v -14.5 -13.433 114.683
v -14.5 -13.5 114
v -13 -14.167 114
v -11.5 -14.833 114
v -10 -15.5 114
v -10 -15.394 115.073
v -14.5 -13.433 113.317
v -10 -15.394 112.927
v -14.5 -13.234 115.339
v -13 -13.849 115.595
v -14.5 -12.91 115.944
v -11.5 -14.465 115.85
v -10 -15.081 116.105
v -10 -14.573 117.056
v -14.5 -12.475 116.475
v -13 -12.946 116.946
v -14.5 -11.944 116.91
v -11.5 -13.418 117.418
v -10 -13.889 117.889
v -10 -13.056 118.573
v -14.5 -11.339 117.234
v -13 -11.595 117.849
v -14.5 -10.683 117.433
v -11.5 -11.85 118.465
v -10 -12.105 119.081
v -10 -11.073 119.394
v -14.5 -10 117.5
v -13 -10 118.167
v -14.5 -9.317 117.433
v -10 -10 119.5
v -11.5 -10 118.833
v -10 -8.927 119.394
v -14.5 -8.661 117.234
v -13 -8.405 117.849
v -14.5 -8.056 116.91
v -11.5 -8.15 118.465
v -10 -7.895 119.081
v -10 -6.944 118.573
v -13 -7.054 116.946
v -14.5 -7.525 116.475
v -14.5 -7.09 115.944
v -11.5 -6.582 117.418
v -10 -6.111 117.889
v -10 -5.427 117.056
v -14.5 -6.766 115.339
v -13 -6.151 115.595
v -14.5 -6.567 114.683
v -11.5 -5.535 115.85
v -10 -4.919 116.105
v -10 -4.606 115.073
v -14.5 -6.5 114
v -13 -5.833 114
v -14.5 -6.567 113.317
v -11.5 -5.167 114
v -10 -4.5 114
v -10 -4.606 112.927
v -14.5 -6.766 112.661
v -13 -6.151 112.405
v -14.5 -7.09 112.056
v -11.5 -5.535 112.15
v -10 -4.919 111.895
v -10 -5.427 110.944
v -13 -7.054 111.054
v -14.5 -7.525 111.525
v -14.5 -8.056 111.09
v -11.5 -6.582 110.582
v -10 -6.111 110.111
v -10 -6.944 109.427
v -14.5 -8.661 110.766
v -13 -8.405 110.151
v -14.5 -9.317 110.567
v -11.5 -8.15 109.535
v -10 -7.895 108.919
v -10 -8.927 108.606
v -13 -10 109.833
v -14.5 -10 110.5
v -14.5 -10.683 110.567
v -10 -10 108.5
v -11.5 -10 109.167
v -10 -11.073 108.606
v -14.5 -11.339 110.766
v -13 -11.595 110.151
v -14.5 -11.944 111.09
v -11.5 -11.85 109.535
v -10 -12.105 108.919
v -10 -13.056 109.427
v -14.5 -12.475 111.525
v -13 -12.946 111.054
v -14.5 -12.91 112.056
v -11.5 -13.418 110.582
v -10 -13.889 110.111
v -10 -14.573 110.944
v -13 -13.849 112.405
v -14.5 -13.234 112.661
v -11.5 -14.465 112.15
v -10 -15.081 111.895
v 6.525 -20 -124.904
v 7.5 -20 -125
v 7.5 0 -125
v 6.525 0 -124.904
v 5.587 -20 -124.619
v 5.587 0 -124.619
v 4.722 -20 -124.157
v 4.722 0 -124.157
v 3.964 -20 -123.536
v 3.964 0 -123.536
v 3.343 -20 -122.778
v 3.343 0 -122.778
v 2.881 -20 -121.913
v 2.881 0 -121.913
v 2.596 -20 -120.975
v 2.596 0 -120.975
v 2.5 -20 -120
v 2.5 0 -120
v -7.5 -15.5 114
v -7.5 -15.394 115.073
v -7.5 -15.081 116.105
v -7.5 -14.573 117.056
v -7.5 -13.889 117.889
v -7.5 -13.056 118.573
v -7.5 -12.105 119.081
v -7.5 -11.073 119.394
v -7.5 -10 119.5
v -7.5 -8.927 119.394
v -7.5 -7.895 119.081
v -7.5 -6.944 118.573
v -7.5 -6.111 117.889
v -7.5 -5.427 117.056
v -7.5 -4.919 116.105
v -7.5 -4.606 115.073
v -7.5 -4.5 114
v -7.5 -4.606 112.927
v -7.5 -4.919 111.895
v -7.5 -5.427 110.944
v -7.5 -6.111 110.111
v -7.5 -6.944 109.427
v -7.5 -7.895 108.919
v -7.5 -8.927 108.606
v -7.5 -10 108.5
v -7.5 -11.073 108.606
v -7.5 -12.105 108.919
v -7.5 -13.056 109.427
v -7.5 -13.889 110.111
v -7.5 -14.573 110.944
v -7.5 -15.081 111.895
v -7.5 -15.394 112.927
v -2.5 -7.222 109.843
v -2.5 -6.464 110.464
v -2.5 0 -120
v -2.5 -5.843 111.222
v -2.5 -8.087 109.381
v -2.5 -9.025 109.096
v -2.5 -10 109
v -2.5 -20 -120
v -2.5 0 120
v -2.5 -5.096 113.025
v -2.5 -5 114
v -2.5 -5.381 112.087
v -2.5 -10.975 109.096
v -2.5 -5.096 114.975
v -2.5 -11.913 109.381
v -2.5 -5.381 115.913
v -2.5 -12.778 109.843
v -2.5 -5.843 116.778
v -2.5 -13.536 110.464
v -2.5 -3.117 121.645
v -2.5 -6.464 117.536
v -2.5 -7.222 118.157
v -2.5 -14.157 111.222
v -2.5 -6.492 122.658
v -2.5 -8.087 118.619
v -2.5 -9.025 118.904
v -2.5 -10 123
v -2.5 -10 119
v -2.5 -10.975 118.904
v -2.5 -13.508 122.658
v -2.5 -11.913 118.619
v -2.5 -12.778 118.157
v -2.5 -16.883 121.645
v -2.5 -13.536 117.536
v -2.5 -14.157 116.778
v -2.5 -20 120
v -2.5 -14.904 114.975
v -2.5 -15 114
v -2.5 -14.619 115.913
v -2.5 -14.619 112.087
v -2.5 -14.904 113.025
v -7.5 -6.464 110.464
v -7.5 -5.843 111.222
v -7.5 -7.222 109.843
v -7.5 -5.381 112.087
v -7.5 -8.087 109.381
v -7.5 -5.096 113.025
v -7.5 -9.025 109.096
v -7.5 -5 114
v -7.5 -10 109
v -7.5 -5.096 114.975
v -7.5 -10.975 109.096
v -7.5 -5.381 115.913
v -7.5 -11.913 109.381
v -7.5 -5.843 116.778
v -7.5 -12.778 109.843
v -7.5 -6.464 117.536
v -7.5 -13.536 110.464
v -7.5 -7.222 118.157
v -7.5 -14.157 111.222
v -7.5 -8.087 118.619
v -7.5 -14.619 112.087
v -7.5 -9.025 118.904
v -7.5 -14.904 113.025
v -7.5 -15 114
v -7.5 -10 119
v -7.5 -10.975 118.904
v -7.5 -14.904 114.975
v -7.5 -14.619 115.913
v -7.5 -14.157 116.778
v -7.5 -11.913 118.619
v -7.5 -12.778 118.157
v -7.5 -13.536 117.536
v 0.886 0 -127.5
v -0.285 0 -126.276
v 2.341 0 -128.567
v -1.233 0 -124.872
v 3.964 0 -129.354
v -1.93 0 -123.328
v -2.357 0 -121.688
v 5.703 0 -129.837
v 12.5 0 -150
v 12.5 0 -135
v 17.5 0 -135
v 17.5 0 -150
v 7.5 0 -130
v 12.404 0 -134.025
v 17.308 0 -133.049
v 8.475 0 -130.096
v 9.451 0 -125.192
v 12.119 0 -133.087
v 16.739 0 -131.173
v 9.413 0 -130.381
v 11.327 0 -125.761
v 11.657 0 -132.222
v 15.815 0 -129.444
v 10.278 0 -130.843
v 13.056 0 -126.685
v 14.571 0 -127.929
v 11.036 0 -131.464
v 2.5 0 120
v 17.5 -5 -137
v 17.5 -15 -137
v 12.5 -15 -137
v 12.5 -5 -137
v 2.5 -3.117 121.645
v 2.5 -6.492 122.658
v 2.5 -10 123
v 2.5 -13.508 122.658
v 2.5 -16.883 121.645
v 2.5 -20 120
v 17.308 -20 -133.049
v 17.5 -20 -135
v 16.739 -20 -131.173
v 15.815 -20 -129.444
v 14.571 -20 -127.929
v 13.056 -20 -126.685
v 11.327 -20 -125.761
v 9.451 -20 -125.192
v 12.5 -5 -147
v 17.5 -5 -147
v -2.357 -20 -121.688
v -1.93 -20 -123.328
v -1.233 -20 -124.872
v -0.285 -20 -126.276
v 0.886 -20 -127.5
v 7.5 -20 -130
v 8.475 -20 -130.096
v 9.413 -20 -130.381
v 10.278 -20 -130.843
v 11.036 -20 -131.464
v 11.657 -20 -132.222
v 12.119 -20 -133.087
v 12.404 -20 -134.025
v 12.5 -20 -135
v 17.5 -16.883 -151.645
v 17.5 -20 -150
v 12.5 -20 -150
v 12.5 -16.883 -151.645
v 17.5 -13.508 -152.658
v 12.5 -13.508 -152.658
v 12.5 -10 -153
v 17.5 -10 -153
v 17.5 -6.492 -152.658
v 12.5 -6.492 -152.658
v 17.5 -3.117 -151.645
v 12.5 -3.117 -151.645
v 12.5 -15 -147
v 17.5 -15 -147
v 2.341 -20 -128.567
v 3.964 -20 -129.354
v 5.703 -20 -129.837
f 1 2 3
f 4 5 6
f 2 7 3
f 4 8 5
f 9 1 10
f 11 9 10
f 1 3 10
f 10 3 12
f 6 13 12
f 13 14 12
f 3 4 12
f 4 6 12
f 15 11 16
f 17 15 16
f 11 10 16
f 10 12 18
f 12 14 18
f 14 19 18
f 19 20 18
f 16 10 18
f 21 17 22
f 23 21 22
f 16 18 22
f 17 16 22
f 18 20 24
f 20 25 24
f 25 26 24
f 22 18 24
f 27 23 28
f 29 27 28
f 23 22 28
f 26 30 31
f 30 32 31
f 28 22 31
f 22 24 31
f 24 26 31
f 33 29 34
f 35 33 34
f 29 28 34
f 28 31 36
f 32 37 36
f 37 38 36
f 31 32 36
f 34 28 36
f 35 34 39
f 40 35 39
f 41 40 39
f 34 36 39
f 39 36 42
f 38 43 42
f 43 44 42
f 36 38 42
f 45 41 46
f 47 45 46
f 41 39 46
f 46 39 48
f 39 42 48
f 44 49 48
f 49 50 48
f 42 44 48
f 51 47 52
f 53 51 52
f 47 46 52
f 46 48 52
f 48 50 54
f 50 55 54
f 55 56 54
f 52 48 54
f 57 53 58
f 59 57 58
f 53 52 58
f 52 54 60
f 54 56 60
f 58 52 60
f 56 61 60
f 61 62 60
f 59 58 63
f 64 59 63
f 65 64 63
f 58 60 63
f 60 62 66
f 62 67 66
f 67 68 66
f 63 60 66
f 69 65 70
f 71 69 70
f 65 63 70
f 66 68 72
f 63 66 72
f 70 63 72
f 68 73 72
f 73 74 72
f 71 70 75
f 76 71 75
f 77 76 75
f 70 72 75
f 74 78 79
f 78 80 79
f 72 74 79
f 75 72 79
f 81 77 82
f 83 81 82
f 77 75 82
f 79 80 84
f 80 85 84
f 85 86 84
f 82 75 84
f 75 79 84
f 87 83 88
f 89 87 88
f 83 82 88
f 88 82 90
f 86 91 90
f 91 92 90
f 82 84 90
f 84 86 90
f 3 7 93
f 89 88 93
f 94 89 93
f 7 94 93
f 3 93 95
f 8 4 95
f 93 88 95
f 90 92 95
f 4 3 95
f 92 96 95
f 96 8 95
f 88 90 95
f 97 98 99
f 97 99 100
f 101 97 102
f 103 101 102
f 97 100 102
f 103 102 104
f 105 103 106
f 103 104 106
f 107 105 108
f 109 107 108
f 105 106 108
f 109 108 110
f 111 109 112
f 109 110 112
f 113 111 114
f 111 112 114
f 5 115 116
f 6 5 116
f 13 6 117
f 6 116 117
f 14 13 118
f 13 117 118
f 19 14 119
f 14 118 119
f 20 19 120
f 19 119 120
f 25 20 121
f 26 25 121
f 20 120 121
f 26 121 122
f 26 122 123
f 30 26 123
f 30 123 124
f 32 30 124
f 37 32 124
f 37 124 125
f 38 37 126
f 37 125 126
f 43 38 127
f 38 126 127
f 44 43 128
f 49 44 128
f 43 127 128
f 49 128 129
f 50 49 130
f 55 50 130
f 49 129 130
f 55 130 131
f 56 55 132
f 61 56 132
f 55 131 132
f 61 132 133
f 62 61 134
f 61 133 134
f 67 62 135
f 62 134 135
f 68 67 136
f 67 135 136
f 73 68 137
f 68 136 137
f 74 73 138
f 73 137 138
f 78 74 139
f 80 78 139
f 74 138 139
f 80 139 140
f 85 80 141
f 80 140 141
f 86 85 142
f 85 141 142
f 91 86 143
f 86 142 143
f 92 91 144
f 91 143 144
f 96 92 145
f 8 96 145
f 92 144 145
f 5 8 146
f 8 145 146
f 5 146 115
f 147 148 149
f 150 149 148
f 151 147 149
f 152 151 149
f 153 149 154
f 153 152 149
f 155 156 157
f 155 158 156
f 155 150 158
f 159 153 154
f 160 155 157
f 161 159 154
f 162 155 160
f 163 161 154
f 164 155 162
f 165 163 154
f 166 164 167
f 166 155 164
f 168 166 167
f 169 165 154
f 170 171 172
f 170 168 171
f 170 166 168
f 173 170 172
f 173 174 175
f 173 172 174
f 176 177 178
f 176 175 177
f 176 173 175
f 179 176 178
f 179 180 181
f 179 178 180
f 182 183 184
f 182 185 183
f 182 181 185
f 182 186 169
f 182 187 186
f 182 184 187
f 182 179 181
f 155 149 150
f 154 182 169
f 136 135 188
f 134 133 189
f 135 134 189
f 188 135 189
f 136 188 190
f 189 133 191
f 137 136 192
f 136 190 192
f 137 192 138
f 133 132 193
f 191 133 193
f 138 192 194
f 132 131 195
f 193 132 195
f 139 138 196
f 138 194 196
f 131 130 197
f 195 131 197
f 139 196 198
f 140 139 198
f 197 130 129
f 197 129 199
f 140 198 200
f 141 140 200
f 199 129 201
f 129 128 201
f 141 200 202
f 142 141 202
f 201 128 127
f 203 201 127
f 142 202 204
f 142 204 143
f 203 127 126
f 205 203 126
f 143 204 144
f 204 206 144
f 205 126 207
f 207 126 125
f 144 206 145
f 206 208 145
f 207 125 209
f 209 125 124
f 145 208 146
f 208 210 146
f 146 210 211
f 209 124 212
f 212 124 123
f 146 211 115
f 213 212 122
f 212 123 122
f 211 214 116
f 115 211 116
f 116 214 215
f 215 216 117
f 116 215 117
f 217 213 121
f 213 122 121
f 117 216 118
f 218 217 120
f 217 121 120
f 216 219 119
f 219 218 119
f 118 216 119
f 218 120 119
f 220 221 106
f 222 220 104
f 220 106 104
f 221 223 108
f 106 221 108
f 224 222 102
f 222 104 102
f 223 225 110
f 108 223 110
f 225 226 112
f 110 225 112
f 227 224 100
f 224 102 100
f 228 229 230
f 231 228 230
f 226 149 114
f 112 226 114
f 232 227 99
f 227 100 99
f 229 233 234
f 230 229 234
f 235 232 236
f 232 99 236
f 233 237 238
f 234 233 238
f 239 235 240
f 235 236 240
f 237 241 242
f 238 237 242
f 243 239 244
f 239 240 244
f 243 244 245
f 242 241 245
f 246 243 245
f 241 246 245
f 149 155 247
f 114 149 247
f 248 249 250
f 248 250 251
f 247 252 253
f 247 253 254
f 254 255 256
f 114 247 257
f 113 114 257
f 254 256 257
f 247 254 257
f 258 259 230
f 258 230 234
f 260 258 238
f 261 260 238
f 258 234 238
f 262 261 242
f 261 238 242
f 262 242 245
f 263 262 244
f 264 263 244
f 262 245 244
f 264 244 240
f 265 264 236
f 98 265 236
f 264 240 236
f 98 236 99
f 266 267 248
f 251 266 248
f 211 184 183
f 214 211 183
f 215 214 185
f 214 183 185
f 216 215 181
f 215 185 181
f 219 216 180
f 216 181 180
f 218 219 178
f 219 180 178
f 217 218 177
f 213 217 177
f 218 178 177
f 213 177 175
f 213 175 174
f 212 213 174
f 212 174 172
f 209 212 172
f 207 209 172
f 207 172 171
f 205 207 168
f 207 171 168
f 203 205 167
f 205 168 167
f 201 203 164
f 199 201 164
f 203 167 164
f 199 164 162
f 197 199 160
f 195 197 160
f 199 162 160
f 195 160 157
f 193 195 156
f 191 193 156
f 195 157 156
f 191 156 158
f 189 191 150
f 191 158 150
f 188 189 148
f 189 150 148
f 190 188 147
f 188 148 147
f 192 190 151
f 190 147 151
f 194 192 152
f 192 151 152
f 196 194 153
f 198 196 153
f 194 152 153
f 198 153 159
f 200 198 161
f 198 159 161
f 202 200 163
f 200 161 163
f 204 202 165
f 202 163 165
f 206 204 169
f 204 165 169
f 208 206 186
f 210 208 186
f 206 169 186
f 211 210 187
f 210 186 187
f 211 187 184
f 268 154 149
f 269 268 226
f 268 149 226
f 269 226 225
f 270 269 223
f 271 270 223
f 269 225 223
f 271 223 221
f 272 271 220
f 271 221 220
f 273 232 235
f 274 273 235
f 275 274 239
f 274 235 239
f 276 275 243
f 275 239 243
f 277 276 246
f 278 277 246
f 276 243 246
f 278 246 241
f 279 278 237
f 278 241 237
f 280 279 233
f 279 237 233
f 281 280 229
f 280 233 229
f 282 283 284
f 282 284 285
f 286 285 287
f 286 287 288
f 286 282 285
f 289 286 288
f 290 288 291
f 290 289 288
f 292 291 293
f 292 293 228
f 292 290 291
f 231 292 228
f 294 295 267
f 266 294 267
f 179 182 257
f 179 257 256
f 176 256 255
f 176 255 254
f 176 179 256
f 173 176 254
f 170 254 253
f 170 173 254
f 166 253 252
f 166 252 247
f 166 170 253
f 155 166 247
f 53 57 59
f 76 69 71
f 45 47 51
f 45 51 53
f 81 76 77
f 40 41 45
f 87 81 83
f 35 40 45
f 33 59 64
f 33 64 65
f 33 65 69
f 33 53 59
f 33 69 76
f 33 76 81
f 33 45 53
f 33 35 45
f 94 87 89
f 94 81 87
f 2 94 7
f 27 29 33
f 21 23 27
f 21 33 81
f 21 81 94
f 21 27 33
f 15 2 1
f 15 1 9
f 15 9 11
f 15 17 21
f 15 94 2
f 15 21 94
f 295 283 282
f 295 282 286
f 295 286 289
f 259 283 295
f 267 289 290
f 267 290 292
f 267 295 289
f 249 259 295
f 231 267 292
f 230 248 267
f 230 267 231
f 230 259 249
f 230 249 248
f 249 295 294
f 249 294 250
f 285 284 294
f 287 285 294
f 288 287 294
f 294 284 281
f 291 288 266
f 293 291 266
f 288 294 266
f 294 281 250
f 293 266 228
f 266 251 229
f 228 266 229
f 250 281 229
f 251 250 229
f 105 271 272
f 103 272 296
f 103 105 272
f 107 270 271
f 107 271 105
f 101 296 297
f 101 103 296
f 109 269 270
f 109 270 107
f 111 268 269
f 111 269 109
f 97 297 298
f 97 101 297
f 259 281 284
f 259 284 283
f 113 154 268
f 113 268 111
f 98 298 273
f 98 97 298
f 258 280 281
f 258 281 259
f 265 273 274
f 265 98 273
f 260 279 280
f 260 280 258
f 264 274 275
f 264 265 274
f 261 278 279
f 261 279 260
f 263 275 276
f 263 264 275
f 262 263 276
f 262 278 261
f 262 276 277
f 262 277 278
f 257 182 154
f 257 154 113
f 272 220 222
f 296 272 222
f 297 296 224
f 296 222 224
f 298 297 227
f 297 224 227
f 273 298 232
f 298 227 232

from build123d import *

# Parameters (mm, degrees)
F0_W      = 5
F0_H      = 15
F1_DEPTH  = 20
F3_DEPTH  = 5
F2_W      = 10
F2_H      = 10
F4_DEPTH  = 20.001
F6_DEPTH  = 5
F5_R      = 5
F7_DEPTH  = 5
F8_R      = 5.5
F8_R_2    = 5
F9_DEPTH  = 2.5
F11_R     = 3.5
F9_FACE_R = 5.5


with BuildPart() as f1:
    # F0 (on Front) → F1 (new body)
    with BuildSketch(Plane.XZ):
        with BuildLine():
            ThreePointArc((7.5, -125), (3.9644660941, -123.5355339059), (2.5, -120))
            Line((2.5, -120), (-2.5, -120))
            ThreePointArc((-2.5, -120), (-1.6143782777, -124.1143782777), (0.8856217223, -127.5))
            ThreePointArc((0.8856217223, -127.5), (3.9644660941, -125.6458565331), (7.5, -125))
        make_face()
        with BuildLine():
            Line((-2.5, -120), (2.5, -120))
            Line((2.5, -120), (2.5, -111.3397459622))
            ThreePointArc((2.5, -111.3397459622), (-1.1602540378, -115), (-2.5, -120))
        make_face()
        with BuildLine():
            Line((-2.5, 120), (-2.5, -120))
            ThreePointArc((-2.5, -120), (-1.1602540378, -115), (2.5, -111.3397459622))
            Line((2.5, -111.3397459622), (2.5, 120))
            Line((2.5, 120), (-2.5, 120))
        make_face()
        with BuildLine():
            ThreePointArc((17.5, -135), (14.5710678119, -127.9289321881), (7.5, -125))
            Line((7.5, -125), (7.5, -130))
            ThreePointArc((7.5, -130), (11.0355339059, -131.4644660941), (12.5, -135))
            Line((12.5, -135), (17.5, -135))
        make_face()
        with BuildLine():
            Line((7.5, -130), (7.5, -125))
            ThreePointArc((7.5, -125), (3.9644660941, -125.6458565331), (0.8856217223, -127.5))
            ThreePointArc((0.8856217223, -127.5), (3.9644660941, -129.3541434669), (7.5, -130))
        make_face()
        with Locations((15, -142.5)):
            Rectangle(F0_W, F0_H)
    extrude(amount=F1_DEPTH)

    # F2 (on face) → F3 (join)
    with BuildSketch(Plane.YZ.offset(17.5)):
        with BuildLine():
            Line((0, -150), (-20, -150))
            ThreePointArc((-20, -150), (-10, -153), (0, -150))
        make_face()
    extrude(amount=-F3_DEPTH)

    # F2 (on face) → F4 (cut, through all)
    with BuildSketch(Plane.YZ.offset(17.5)):
        with Locations((-10, -142)):
            Rectangle(F2_W, F2_H)
    extrude(amount=-F4_DEPTH, mode=Mode.SUBTRACT)

    # F5 (on face) → F6 (join)
    with BuildSketch(Plane(origin=(-2.5, 0, 0), x_dir=(0, -1, 0), z_dir=(-1, 0, 0))):
        with BuildLine():
            Line((0, 120), (20, 120))
            ThreePointArc((20, 120), (10, 123), (0, 120))
        make_face()
    extrude(amount=-F6_DEPTH)

    # F5 (on face) → F7 (join)
    with BuildSketch(Plane(origin=(-2.5, 0, 0), x_dir=(0, -1, 0), z_dir=(-1, 0, 0))):
        with Locations((10, 114)):
            Circle(F5_R)
    extrude(amount=F7_DEPTH)

    # F8 (on face) → F9 (join)
    with BuildSketch(Plane(origin=(-7.5, 0, 0), x_dir=(0, -1, 0), z_dir=(-1, 0, 0))):
        with Locations((10, 114)):
            Circle(F8_R)
        with Locations((10, 114)):
            Circle(F8_R_2, mode=Mode.SUBTRACT)
        with Locations((10, 114)):
            Circle(F8_R_2)
    extrude(amount=F9_DEPTH)

    # F11 (on offset) → F12 section 0
    with BuildSketch(Plane(origin=(-14.5, 0, 0), x_dir=(0, -1, 0), z_dir=(-1, 0, 0))):
        with Locations((10, 114)):
            Circle(F11_R)
    # F9_face (on face) → F12 section 1
    with BuildSketch(Plane(origin=(-10, -10, 114), x_dir=(0, -1, 0), z_dir=(-1, 0, 0))):
        Circle(F9_FACE_R)
    loft()


solid = f1.part
